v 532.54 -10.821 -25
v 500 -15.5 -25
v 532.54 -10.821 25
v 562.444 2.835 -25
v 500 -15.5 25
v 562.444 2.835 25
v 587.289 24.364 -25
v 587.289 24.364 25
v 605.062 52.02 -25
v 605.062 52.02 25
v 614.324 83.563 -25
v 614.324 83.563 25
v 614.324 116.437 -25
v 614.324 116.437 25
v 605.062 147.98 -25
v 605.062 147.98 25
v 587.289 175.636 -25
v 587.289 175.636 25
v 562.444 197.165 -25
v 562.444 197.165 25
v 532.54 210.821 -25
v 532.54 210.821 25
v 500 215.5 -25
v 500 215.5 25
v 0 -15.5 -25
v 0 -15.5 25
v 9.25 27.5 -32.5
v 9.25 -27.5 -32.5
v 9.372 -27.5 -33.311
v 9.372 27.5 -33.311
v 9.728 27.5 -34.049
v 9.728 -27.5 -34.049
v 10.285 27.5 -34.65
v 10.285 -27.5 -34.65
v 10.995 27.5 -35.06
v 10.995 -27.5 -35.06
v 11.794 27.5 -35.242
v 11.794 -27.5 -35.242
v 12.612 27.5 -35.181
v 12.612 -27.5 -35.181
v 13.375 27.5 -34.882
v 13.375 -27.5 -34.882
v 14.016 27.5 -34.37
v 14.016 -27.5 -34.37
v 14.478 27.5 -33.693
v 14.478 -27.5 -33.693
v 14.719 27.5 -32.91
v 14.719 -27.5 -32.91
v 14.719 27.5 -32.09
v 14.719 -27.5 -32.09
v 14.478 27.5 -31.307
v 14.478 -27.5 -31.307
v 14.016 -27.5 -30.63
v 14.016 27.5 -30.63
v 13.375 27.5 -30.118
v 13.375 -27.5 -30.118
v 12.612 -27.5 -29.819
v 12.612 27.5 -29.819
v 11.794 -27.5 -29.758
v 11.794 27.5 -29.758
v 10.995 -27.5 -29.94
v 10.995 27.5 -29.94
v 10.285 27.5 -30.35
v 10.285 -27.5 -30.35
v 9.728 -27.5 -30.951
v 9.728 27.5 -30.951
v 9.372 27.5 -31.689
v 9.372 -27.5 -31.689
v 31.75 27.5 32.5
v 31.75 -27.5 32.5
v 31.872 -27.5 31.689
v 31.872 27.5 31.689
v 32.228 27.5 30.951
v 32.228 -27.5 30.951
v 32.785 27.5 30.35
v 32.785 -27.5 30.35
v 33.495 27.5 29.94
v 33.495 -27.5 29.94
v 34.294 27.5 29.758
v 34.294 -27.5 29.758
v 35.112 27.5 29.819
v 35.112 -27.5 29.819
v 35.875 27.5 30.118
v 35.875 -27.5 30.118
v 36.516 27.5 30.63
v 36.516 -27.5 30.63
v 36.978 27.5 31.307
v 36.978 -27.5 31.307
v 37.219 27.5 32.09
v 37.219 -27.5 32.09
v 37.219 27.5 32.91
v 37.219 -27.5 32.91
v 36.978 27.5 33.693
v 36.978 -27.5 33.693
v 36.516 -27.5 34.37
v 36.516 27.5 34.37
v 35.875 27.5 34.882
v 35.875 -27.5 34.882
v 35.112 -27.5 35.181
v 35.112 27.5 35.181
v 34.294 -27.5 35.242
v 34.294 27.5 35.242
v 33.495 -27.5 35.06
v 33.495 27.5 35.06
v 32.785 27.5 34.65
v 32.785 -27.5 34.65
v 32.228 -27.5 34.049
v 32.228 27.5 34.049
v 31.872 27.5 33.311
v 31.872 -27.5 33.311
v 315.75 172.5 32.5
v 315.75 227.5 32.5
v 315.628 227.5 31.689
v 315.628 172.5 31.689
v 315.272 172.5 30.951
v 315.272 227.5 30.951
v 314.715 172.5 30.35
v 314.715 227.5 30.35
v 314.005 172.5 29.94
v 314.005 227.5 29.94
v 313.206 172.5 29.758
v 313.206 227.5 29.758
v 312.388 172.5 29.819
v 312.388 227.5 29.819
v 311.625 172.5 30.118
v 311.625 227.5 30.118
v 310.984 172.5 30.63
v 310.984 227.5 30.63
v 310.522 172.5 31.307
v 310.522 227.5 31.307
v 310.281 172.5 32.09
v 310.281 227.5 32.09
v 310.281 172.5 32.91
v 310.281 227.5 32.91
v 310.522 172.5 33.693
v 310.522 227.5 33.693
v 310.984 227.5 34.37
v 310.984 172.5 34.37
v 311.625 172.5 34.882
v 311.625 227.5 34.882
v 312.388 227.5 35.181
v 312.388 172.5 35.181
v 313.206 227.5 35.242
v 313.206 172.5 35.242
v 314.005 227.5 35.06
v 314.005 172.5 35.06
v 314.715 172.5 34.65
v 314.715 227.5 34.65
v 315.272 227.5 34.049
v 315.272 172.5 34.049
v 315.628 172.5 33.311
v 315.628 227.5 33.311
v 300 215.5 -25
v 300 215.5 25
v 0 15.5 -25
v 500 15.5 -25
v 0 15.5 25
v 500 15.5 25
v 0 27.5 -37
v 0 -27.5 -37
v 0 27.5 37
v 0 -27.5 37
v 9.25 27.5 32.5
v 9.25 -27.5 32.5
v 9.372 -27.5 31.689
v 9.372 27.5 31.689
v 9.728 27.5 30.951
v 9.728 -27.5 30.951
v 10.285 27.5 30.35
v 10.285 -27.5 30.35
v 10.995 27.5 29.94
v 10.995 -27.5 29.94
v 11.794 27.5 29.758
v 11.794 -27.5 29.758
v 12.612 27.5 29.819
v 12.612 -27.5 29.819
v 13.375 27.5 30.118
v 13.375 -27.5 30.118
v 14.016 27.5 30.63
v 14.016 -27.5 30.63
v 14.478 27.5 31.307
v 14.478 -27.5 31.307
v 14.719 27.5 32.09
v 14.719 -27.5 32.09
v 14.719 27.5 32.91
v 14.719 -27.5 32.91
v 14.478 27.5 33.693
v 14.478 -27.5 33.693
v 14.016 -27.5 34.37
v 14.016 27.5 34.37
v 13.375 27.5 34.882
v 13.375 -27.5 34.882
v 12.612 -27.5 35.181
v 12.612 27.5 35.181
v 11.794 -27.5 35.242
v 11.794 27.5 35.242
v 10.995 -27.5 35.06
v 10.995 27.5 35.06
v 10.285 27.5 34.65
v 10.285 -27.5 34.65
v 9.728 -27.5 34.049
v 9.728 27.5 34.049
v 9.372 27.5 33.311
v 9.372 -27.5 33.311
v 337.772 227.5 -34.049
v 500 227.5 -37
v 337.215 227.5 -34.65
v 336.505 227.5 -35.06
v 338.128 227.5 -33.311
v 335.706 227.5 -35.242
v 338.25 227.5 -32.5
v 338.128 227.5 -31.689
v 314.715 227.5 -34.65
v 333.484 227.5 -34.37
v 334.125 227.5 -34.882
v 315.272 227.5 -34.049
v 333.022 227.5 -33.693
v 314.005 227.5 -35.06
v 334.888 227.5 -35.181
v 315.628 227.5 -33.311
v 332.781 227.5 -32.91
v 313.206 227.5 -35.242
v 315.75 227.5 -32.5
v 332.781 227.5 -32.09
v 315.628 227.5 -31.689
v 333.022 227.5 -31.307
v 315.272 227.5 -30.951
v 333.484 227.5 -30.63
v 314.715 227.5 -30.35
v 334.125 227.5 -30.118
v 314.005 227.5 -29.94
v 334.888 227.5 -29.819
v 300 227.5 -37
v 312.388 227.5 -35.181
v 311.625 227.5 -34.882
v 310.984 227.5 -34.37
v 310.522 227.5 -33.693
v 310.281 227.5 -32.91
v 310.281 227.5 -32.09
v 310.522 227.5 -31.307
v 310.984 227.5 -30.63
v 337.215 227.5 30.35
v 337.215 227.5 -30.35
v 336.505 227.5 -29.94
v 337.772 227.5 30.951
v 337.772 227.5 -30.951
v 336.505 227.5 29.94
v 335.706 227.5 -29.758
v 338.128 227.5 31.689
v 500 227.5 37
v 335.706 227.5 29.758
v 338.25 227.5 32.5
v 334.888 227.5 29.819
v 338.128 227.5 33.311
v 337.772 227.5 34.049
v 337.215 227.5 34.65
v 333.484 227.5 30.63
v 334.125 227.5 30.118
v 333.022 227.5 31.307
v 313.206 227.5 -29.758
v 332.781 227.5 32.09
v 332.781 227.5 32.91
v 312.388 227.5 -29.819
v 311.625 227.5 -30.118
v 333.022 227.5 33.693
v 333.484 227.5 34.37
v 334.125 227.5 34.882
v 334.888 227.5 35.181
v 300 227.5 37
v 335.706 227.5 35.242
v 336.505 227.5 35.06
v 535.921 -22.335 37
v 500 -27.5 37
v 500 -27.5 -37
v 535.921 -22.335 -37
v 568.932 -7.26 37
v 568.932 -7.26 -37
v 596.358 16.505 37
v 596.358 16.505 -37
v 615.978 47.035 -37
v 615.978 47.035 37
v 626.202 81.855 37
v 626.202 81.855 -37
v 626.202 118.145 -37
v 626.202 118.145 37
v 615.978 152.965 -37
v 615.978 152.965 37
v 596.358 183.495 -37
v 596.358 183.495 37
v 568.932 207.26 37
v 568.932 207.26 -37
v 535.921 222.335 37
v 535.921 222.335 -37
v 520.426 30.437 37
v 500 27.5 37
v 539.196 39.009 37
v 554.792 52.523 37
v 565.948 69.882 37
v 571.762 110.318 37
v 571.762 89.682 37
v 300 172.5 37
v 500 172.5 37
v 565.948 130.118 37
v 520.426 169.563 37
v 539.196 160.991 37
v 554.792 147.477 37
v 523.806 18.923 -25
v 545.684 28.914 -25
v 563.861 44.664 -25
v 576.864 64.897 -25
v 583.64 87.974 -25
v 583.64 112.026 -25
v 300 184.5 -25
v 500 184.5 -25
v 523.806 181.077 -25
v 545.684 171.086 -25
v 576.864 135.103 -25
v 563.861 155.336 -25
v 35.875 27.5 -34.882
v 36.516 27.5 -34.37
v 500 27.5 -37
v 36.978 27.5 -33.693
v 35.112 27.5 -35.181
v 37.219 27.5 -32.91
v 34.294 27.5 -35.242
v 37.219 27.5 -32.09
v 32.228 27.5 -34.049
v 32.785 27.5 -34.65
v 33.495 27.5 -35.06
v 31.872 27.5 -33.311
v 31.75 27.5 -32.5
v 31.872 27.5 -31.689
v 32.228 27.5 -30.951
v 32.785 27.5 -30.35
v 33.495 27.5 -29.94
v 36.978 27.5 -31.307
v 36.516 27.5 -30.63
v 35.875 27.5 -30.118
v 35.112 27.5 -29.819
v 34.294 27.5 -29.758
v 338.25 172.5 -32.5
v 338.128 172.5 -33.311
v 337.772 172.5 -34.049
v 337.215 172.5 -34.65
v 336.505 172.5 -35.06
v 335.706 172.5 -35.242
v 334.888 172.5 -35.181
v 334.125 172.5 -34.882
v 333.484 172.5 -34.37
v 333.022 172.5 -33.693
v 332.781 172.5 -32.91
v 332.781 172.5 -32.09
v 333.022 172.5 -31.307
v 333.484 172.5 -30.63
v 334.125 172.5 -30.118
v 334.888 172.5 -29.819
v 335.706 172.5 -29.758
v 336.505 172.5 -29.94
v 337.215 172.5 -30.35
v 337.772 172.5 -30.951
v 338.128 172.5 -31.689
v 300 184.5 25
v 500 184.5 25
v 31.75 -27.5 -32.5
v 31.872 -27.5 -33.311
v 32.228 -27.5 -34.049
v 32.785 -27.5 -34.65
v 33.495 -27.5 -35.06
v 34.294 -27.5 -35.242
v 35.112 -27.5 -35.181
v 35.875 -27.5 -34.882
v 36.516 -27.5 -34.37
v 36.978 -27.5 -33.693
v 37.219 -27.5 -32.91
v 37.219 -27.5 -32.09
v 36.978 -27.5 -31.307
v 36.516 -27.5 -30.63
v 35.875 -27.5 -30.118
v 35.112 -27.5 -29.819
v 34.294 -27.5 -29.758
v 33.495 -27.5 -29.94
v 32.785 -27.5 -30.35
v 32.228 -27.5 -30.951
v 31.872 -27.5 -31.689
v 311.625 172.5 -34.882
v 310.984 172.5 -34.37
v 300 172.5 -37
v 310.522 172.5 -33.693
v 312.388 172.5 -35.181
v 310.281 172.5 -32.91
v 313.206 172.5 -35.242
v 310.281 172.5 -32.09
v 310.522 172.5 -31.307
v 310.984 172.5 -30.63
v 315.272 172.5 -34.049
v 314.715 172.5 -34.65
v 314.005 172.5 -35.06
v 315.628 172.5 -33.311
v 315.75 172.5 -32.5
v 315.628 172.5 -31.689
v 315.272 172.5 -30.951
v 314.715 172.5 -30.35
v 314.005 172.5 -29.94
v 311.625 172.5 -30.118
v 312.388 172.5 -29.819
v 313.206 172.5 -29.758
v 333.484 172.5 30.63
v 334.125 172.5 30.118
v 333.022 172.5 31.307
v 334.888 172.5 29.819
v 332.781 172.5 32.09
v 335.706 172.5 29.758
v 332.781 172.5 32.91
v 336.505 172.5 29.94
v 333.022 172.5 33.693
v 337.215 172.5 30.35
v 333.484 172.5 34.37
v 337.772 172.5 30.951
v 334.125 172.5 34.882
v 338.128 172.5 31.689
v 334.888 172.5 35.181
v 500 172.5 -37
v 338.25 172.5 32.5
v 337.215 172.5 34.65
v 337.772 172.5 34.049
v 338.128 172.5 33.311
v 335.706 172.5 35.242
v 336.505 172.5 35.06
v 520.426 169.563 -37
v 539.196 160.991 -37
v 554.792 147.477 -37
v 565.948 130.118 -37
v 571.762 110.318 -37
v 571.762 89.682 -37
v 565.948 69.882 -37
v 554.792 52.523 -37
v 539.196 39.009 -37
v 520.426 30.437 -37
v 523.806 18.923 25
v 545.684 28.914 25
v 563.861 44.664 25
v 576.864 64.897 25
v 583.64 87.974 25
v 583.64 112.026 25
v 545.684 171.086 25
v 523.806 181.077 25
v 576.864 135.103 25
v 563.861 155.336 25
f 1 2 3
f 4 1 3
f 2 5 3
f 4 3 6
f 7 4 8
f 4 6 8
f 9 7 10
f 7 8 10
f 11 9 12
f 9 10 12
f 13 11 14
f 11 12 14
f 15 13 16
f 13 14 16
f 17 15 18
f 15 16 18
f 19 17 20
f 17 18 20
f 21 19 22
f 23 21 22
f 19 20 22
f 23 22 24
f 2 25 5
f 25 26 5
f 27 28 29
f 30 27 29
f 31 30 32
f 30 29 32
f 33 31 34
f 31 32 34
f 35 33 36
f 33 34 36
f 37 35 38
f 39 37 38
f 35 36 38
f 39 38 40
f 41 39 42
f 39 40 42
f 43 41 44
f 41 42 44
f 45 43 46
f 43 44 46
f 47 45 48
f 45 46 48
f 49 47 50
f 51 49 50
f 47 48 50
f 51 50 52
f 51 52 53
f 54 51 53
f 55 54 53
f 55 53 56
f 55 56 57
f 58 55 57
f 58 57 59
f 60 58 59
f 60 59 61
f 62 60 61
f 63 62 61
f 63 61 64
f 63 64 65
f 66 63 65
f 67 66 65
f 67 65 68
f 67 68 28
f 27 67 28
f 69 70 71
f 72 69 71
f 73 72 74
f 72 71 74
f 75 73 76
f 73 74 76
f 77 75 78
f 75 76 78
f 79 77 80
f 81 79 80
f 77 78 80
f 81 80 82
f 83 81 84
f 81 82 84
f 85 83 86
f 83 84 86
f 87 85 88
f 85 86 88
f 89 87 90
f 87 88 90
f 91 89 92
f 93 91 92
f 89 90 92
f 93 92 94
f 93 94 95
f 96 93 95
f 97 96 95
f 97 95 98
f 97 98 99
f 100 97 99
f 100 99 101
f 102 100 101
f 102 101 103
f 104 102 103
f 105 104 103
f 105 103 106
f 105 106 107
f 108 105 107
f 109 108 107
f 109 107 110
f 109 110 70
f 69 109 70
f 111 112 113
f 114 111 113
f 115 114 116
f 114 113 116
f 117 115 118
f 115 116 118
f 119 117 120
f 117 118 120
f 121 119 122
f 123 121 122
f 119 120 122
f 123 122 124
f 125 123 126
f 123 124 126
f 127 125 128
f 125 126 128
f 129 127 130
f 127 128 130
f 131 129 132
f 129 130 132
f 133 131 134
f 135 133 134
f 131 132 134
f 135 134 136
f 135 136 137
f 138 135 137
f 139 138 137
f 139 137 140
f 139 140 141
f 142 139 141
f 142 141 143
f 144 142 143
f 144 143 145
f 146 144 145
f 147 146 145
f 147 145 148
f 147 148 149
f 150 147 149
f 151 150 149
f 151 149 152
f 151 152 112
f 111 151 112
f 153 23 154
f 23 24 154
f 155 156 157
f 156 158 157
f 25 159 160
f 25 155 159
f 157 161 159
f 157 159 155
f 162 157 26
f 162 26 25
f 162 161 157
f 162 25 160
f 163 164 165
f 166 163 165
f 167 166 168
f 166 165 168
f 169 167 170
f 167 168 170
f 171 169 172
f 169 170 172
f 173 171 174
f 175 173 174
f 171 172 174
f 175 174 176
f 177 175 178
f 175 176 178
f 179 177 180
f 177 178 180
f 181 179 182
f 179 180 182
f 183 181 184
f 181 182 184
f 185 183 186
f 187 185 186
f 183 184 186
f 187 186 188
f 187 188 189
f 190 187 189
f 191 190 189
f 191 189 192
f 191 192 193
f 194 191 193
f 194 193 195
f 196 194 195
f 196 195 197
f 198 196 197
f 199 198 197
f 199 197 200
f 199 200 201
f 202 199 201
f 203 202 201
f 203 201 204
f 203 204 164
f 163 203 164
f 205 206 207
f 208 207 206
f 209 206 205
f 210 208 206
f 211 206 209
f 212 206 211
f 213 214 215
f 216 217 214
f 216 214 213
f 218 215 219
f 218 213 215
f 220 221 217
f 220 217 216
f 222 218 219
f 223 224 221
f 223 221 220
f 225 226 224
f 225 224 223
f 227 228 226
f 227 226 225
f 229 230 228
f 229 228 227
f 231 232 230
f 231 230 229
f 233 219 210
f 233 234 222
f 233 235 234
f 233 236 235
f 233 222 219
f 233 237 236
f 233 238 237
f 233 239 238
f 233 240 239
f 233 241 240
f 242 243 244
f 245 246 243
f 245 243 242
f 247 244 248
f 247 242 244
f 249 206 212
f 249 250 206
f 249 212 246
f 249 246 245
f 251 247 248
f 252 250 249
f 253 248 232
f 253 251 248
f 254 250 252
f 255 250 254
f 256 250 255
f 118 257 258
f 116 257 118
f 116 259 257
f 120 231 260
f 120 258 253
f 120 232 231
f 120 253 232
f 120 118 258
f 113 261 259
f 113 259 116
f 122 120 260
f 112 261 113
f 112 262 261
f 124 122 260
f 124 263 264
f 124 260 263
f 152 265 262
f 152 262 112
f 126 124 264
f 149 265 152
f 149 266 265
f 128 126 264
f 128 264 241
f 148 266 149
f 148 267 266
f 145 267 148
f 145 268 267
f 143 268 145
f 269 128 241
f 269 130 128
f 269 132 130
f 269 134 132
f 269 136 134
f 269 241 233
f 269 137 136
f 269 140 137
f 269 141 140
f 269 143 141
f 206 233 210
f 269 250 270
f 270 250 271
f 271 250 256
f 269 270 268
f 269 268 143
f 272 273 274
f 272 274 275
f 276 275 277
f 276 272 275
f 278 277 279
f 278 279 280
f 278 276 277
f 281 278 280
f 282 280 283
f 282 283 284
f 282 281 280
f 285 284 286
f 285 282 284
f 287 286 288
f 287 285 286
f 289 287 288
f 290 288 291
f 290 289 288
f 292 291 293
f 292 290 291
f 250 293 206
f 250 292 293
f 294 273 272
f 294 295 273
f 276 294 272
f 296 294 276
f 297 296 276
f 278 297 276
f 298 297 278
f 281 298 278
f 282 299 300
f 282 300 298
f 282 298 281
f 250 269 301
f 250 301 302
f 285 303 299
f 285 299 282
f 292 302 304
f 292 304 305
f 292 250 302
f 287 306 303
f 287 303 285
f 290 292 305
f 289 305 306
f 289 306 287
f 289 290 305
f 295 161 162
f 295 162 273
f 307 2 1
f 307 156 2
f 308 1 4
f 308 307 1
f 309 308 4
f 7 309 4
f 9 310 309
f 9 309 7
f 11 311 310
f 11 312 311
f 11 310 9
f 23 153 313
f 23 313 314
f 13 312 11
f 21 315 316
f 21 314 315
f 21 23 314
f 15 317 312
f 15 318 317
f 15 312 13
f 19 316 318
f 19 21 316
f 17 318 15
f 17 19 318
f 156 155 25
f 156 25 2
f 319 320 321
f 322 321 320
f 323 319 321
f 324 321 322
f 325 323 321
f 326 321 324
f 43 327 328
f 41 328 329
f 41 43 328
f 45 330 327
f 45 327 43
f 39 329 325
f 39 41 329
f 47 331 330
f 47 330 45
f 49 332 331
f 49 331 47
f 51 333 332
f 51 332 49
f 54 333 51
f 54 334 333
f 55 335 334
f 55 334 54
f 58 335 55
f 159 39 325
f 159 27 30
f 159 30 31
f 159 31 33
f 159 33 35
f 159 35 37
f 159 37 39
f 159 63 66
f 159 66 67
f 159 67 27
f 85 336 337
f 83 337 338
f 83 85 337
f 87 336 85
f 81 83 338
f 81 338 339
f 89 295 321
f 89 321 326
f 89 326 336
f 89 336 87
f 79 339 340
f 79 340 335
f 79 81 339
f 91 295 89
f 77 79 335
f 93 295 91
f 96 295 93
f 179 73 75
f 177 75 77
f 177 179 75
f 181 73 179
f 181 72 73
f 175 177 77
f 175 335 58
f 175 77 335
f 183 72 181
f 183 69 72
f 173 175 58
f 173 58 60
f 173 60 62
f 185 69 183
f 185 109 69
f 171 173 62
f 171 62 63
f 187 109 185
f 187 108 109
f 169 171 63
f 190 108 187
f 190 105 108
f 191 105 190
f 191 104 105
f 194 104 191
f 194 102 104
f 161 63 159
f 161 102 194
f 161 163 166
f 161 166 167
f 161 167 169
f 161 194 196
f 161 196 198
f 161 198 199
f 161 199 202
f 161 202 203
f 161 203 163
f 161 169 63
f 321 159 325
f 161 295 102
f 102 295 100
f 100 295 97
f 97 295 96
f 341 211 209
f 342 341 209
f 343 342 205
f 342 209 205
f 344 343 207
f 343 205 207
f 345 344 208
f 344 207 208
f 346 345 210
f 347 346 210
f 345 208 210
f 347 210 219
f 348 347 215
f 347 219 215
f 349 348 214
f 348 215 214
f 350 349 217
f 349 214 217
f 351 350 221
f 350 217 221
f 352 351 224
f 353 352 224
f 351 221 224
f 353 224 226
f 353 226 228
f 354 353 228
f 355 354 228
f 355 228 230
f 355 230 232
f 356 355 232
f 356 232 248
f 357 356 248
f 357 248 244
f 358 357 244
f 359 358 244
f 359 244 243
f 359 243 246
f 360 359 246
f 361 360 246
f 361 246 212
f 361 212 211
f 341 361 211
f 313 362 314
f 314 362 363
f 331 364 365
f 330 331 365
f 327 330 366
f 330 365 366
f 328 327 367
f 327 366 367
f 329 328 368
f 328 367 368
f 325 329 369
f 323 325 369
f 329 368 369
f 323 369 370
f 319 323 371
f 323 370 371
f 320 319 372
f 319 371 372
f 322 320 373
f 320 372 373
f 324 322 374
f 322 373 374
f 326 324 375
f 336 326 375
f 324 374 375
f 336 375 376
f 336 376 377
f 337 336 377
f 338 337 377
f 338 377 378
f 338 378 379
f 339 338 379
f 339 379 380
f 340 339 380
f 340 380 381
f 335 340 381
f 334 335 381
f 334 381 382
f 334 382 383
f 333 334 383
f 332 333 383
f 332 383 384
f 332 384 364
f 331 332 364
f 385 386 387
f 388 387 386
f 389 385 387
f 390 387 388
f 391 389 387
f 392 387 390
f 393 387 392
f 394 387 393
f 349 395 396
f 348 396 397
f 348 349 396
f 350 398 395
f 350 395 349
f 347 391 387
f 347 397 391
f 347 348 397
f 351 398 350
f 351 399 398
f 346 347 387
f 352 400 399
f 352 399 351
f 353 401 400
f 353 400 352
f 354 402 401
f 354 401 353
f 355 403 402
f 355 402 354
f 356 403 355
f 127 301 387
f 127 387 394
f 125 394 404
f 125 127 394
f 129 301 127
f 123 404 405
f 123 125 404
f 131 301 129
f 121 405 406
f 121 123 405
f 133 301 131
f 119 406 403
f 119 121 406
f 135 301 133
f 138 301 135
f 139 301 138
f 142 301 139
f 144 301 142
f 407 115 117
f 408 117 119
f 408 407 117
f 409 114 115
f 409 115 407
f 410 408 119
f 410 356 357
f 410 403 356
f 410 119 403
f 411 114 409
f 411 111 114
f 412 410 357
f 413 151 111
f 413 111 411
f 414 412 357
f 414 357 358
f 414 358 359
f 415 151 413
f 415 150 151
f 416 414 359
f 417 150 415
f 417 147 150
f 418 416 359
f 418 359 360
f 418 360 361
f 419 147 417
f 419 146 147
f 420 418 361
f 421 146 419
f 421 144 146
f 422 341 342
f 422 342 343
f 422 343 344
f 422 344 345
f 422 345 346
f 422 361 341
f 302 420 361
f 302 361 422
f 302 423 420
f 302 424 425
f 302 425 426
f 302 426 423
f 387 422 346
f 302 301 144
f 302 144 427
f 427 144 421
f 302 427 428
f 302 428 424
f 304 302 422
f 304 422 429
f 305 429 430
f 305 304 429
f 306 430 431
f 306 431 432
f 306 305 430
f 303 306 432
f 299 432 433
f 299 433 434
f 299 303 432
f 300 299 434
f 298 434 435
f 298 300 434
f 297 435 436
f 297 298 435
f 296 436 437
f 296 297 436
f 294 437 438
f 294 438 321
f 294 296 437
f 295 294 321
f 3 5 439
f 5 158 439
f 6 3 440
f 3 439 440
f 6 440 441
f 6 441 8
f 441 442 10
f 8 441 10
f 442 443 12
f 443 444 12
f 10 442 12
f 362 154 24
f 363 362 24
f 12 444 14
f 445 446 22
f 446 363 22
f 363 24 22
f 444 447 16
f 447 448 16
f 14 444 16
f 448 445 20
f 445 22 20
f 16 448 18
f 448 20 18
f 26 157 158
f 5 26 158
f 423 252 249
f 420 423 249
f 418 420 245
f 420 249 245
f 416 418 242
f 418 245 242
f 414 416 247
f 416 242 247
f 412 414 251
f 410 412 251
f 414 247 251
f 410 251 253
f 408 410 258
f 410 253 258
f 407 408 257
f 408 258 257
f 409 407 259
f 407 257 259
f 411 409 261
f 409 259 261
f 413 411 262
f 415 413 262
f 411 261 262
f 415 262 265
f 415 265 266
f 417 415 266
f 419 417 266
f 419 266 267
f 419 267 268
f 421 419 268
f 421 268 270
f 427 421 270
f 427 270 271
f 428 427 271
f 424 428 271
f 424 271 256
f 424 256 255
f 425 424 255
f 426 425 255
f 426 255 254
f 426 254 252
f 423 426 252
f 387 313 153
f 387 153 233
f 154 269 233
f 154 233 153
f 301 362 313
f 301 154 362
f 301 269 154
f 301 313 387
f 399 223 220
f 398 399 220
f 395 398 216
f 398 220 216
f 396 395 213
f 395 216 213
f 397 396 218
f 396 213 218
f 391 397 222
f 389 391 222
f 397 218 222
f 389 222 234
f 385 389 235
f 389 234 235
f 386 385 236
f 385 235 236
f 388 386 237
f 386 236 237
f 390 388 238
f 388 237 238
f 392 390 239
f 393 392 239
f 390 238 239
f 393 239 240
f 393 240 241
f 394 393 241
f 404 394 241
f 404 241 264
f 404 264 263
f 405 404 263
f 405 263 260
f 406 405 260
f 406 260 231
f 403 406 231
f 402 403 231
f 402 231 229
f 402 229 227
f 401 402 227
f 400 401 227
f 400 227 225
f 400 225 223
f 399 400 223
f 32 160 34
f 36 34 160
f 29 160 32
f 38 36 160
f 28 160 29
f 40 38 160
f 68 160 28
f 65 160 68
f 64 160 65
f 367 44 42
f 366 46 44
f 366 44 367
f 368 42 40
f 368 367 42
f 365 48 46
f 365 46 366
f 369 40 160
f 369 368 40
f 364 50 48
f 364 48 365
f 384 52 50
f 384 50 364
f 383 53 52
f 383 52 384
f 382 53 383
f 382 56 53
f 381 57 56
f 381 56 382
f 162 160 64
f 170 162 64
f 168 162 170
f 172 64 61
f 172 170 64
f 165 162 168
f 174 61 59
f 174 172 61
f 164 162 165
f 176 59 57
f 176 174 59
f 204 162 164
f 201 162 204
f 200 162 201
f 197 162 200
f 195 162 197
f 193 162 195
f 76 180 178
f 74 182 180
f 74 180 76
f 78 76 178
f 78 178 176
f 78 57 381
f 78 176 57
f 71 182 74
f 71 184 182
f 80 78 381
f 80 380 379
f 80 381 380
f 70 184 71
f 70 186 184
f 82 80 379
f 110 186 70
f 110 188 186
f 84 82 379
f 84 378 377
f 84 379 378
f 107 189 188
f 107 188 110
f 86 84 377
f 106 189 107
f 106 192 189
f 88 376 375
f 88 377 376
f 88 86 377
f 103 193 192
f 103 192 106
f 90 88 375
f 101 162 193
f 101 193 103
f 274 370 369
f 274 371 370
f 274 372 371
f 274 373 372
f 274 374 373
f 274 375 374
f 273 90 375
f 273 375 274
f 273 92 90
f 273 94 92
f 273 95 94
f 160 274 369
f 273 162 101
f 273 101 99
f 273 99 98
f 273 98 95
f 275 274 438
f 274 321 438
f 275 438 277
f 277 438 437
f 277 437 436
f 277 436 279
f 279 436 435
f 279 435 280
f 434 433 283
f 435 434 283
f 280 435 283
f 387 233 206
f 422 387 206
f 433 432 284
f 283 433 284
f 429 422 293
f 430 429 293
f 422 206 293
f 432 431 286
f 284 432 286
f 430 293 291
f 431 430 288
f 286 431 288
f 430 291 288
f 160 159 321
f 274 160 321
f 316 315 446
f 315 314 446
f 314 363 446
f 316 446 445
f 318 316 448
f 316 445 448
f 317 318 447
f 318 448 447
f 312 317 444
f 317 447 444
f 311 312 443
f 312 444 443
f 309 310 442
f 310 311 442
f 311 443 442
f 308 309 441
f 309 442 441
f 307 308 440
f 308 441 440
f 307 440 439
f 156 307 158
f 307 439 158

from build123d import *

# Parameters (mm, degrees)
EXTRUDE_1_DEPTH         = 37
SHELL_1_T               = -12
HOLE_WIZARD_M5_2_D      = 5.5
HOLE_WIZARD_M5_1_REACH  = 680.344
HOLE_WIZARD_M5_1_BORE_R = 2.75


with BuildPart() as part:
    # 草图1 → 拉伸-薄壁1 (new, symmetric)
    with BuildSketch(Plane.XY):
        with BuildLine():
            Line((0, -27.5), (500, -27.5))
            ThreePointArc((500, -27.5), (627.5, 100), (500, 227.5))
            Line((500, 227.5), (300, 227.5))
            Line((300, 227.5), (300, 172.5))
            Line((300, 172.5), (500, 172.5))
            ThreePointArc((500, 172.5), (572.5, 100), (500, 27.5))
            Line((500, 27.5), (0, 27.5))
            Line((0, 27.5), (0, -27.5))
        make_face()
    extrude(amount=EXTRUDE_1_DEPTH, both=True)

    # 抽壳1
    shell_1_openings = [part.faces().sort_by_distance(p)[0] for p in [
        (0, 0, 0),
        (300, 200, 0),
    ]]
    offset(amount=SHELL_1_T, openings=shell_1_openings, kind=Kind.INTERSECTION)

    # M5 间隙孔2 (through all)
    with Locations(Plane(origin=(0, 27.5, 0), x_dir=(1, 0, 0), z_dir=(0, 1, 0))):
        with Locations((12, 32.5), (34.5, 32.5), (34.5, -32.5), (12, -32.5)):
            Hole(HOLE_WIZARD_M5_2_D / 2)

    # M5 间隙孔1 bore → M5 间隙孔1 (cut, up to next)
    with BuildSketch(Plane(origin=(0, 227.5, 0), x_dir=(1, 0, 0), z_dir=(0, 1, 0)), mode=Mode.PRIVATE) as hole_wizard_m5_1_sk1:
        with Locations((313, 32.5)):
            Circle(HOLE_WIZARD_M5_1_BORE_R)
    hole_wizard_m5_1_tool1 = extrude(hole_wizard_m5_1_sk1.sketch, amount=-HOLE_WIZARD_M5_1_REACH, mode=Mode.PRIVATE) & part.part
    # M5 间隙孔1 bore → M5 间隙孔1 (cut, up to next)
    with BuildSketch(Plane(origin=(0, 227.5, 0), x_dir=(1, 0, 0), z_dir=(0, 1, 0)), mode=Mode.PRIVATE) as hole_wizard_m5_1_sk2:
        with Locations((335.5, 32.5)):
            Circle(HOLE_WIZARD_M5_1_BORE_R)
    hole_wizard_m5_1_tool2 = extrude(hole_wizard_m5_1_sk2.sketch, amount=-HOLE_WIZARD_M5_1_REACH, mode=Mode.PRIVATE) & part.part
    # M5 间隙孔1 bore → M5 间隙孔1 (cut, up to next)
    with BuildSketch(Plane(origin=(0, 227.5, 0), x_dir=(1, 0, 0), z_dir=(0, 1, 0)), mode=Mode.PRIVATE) as hole_wizard_m5_1_sk3:
        with Locations((335.5, -32.5)):
            Circle(HOLE_WIZARD_M5_1_BORE_R)
    hole_wizard_m5_1_tool3 = extrude(hole_wizard_m5_1_sk3.sketch, amount=-HOLE_WIZARD_M5_1_REACH, mode=Mode.PRIVATE) & part.part
    # M5 间隙孔1 bore → M5 间隙孔1 (cut, up to next)
    with BuildSketch(Plane(origin=(0, 227.5, 0), x_dir=(1, 0, 0), z_dir=(0, 1, 0)), mode=Mode.PRIVATE) as hole_wizard_m5_1_sk4:
        with Locations((313, -32.5)):
            Circle(HOLE_WIZARD_M5_1_BORE_R)
    hole_wizard_m5_1_tool4 = extrude(hole_wizard_m5_1_sk4.sketch, amount=-HOLE_WIZARD_M5_1_REACH, mode=Mode.PRIVATE) & part.part
    add(hole_wizard_m5_1_tool1.solids().sort_by_distance((313, 227.5, -32.5))[0], mode=Mode.SUBTRACT)
    add(hole_wizard_m5_1_tool2.solids().sort_by_distance((335.5, 227.5, -32.5))[0], mode=Mode.SUBTRACT)
    add(hole_wizard_m5_1_tool3.solids().sort_by_distance((335.5, 227.5, 32.5))[0], mode=Mode.SUBTRACT)
    add(hole_wizard_m5_1_tool4.solids().sort_by_distance((313, 227.5, 32.5))[0], mode=Mode.SUBTRACT)


solid = part.part
